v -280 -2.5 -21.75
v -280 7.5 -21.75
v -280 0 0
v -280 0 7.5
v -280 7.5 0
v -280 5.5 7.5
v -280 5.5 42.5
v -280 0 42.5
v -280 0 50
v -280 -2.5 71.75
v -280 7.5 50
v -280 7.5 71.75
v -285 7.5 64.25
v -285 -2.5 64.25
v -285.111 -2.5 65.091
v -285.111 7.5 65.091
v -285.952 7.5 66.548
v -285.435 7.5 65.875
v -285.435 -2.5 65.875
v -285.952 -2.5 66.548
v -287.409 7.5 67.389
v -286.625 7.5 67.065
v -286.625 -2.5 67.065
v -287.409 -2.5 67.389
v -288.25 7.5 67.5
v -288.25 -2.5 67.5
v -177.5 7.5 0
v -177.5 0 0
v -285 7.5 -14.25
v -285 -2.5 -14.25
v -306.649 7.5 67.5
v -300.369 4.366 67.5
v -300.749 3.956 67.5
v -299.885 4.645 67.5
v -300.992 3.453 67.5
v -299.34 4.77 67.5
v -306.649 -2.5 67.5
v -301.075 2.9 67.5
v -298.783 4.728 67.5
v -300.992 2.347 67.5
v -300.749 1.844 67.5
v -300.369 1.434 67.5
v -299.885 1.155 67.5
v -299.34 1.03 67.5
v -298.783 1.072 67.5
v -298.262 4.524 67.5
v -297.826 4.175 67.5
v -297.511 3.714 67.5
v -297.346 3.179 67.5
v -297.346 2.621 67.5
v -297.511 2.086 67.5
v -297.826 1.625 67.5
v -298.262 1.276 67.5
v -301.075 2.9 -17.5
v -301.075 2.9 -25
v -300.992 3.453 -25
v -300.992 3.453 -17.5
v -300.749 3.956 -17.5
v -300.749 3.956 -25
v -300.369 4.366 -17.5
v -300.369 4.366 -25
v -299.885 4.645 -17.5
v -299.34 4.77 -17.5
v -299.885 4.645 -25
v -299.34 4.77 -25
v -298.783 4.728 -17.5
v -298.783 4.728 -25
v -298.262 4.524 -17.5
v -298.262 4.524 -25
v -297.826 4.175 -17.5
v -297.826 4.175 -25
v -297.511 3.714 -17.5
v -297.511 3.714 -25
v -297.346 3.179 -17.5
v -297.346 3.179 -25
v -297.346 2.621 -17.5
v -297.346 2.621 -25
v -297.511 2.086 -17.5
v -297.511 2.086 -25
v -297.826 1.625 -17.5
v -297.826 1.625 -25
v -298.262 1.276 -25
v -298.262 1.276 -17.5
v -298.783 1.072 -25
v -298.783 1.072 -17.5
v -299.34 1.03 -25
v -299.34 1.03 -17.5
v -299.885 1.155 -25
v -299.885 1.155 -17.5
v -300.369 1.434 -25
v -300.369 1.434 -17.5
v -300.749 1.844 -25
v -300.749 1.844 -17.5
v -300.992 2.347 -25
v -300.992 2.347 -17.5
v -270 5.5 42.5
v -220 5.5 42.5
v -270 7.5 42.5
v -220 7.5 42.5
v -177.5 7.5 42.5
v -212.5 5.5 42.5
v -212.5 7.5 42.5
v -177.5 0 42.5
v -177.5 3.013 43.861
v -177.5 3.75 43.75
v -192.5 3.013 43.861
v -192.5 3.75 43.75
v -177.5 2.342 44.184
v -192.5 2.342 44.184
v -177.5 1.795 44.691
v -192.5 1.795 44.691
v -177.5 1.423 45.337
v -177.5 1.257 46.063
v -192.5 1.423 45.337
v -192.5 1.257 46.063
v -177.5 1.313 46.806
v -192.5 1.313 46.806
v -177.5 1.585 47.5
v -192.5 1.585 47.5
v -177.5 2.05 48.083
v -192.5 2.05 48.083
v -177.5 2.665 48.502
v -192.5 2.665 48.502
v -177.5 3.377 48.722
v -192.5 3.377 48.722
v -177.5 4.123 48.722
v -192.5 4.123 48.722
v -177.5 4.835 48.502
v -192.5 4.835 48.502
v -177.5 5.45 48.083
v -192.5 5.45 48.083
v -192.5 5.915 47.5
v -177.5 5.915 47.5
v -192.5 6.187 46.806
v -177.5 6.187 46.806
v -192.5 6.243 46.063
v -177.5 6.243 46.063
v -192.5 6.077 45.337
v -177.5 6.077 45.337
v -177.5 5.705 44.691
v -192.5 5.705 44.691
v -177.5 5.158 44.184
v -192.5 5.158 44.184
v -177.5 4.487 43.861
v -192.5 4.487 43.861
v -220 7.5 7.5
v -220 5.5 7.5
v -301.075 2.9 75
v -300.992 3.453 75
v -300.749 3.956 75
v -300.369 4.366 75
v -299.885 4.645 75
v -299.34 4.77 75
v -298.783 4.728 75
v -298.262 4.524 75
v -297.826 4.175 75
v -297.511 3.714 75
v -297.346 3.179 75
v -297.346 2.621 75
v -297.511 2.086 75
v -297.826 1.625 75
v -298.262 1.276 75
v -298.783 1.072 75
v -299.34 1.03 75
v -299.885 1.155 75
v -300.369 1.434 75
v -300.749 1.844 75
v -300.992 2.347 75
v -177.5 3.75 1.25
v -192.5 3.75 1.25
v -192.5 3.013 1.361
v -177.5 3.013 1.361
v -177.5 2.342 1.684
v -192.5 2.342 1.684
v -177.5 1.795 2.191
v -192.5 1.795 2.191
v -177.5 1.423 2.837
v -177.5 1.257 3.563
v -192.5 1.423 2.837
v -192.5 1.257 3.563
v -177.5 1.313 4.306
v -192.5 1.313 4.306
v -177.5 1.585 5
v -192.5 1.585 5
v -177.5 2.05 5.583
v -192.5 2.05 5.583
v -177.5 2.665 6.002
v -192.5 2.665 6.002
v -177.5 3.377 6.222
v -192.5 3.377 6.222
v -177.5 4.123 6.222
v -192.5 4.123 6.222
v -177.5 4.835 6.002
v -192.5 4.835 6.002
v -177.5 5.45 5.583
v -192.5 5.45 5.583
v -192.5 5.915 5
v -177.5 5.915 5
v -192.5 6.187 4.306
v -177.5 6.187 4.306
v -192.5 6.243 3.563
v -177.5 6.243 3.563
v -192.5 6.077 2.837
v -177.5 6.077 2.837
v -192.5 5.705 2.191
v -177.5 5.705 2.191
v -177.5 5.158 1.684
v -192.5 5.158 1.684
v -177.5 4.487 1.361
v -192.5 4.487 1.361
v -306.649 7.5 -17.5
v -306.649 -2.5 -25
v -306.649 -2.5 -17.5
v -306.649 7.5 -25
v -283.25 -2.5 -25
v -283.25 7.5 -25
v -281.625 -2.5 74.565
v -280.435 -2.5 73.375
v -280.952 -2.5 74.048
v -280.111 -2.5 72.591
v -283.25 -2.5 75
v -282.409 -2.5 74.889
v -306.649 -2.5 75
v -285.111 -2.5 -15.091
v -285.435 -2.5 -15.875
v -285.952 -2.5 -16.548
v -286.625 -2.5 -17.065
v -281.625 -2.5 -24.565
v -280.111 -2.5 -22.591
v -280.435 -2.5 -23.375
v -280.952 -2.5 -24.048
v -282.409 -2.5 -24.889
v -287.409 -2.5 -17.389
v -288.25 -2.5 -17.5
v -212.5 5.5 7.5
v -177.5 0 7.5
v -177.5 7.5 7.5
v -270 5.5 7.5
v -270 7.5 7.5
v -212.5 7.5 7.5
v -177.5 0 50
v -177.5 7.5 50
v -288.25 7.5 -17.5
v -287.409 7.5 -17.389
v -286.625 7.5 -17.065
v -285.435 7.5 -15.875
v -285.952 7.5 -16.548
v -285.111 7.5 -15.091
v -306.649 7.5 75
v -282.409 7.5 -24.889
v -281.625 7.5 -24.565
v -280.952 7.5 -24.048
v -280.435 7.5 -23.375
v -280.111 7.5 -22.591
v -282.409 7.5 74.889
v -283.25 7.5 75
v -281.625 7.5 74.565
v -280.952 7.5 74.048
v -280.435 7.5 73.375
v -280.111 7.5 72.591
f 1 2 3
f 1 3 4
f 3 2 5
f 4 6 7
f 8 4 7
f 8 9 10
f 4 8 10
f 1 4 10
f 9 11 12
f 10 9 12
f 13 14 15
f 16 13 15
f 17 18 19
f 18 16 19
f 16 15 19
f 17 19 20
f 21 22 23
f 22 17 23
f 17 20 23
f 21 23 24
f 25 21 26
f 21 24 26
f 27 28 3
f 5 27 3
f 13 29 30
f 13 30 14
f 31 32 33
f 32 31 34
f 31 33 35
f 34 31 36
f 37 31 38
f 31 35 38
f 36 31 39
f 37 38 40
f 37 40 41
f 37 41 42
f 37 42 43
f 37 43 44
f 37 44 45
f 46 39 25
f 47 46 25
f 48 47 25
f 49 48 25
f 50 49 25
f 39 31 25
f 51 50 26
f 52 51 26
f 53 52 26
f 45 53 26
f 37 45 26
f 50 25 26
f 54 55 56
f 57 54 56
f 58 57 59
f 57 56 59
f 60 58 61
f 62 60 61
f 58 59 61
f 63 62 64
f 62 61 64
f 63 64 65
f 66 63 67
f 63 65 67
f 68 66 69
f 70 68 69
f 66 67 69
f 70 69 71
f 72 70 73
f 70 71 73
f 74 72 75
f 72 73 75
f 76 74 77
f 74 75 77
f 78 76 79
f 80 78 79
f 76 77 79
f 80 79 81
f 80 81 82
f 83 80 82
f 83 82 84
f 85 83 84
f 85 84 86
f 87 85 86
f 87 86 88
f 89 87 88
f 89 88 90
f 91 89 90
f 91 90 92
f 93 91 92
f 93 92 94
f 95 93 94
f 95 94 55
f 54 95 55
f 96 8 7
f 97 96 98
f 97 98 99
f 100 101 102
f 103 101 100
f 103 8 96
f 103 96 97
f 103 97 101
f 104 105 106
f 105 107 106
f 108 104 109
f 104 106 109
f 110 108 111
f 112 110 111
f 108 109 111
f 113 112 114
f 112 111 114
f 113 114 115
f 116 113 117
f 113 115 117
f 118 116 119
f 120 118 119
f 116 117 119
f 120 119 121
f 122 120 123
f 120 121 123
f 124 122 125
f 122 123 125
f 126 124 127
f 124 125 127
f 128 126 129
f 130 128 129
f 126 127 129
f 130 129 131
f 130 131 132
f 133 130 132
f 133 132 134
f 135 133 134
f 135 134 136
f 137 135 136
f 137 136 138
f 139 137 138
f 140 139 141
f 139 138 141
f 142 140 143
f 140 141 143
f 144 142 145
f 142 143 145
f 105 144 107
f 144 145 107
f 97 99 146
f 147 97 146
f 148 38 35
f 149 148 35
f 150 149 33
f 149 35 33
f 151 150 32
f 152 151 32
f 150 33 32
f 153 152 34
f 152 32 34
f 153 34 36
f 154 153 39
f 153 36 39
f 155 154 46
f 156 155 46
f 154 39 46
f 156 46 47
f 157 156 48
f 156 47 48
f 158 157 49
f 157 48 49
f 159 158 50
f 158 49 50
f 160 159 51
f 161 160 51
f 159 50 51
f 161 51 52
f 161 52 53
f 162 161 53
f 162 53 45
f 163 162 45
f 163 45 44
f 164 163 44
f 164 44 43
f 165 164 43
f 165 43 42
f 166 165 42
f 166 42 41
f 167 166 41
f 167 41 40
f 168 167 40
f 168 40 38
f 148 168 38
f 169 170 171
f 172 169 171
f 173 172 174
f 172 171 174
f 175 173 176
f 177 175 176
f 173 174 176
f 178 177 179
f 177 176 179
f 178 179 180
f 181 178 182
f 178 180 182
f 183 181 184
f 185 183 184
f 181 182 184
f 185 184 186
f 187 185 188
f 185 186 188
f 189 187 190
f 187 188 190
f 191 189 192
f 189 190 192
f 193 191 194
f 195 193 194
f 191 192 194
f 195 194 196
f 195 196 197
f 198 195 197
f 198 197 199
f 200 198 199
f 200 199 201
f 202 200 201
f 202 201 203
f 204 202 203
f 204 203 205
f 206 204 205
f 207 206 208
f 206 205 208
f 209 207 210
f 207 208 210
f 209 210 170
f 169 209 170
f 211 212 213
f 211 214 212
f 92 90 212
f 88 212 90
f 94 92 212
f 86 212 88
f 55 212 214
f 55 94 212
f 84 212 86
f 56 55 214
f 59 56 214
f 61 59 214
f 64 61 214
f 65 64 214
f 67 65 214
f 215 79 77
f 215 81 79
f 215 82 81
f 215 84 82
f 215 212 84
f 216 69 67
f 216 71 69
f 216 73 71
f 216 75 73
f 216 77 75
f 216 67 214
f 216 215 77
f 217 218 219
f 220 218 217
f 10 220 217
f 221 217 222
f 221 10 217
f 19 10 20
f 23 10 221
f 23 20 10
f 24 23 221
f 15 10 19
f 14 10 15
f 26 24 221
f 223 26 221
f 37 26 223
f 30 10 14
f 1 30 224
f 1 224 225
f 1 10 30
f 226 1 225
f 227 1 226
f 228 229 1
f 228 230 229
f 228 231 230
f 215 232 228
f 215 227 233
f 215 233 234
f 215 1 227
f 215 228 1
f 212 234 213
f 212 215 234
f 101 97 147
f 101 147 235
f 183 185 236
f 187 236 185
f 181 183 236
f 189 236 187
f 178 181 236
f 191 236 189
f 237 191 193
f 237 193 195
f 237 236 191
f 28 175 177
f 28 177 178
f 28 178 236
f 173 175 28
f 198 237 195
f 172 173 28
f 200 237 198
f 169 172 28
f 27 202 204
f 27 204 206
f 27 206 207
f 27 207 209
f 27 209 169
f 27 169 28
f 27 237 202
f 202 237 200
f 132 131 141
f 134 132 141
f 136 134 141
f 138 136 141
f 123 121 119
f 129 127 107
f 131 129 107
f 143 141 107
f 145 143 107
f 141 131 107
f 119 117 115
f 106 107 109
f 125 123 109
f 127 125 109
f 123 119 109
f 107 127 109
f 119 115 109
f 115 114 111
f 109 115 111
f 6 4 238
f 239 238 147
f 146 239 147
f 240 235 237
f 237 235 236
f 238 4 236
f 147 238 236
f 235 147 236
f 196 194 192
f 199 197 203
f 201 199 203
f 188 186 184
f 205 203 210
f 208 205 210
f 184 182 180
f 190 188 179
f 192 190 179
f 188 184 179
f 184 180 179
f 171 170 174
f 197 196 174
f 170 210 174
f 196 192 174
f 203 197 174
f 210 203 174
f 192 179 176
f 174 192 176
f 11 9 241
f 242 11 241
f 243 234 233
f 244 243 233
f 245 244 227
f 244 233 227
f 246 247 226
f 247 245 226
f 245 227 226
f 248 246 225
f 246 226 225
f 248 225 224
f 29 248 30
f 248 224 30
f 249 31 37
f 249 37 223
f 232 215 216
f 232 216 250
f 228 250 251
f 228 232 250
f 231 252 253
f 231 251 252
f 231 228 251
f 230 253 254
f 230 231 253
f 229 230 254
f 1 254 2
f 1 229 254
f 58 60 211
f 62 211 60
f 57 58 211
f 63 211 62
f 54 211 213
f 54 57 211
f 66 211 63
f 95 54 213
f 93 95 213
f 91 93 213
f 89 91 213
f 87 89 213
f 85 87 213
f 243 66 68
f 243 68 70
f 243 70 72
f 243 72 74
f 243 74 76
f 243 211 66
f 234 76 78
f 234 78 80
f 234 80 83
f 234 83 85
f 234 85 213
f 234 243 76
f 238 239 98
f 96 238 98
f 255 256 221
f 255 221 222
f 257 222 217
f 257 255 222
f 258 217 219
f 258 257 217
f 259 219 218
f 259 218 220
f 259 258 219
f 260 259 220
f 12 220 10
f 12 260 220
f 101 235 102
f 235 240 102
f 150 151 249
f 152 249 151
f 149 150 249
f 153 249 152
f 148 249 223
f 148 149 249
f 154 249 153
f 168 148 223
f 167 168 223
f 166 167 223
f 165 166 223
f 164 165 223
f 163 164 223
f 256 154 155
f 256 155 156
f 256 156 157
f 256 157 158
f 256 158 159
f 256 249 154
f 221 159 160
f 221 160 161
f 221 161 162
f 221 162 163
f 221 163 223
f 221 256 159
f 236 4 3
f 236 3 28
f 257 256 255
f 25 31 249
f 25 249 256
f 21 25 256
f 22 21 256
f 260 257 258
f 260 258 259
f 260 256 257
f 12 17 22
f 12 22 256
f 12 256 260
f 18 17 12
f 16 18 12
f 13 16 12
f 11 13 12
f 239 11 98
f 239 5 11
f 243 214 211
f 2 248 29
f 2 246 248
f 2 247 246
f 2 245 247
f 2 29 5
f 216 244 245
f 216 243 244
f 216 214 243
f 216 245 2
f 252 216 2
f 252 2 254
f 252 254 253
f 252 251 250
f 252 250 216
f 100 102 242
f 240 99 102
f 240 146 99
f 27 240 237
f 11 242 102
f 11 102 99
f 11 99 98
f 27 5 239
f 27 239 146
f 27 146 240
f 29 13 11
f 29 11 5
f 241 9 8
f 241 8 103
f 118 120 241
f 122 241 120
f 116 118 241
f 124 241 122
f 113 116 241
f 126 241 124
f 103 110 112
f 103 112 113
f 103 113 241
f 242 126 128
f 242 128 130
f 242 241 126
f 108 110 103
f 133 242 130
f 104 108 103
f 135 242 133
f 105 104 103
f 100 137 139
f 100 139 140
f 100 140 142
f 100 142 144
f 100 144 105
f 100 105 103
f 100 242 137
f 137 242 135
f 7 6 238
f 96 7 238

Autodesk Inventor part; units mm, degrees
ref_plane "YZ Plane" through (0, 0, 0) normal (1, 0, 0) x (0, 1, 0)
ref_plane "XZ Plane" through (0, 0, 0) normal (0, 1, 0) x (-1, 0, 0)
ref_plane "XY Plane" through (0, 0, 0) normal (0, 0, 1) x (1, 0, 0)
sketch "Sketch1" plane through (0, 0, 0) normal (0, 1, 0) x (-1, 0, 0)
  line L0 (0, 0) -> (50, 0)
  line L1 (50, 0) -> (50, 50)
  line L2 (50, 50) -> (0, 50)
  line L3 (0, 50) -> (0, 0)
  line L4 (50, 50) -> (290, 50)
  line L5 (290, 50) -> (290, 42.5)
  line L6 (290, 42.5) -> (50, 42.5)
  line L7 (50, 42.5) -> (50, 50)
  line L8 (50, 0) -> (290, 0)
  line L9 (290, 0) -> (290, 7.5)
  line L10 (290, 7.5) -> (50, 7.5)
  line L11 (50, 7.5) -> (50, 0)
  dimension "d0" = 50
  dimension "d1" = 50
  dimension "d2" = 240
  dimension "d3" = 7.5
  dimension "d4" = 7.5
extrude "Extrusion1" add sketch "Sketch1" along normal blind 7.5
sketch "Sketch2" plane through (0, 7.5, 0) normal (0, 1, 0) x (1, 0, 0)
  line L0 (0, -50) -> (0, 0) projected
  point P0 (0, -25)
hole "Hole1" at (0, 7.5, 25) direction (0, -1, 0) diameter 6.35 end through all
sketch "Sketch3" plane through (0, 7.5, 0) normal (0, 1, 0) x (1, 0, 0)
  line L0 (-3.175, -50) -> (-3.175, 0) construction
  line L1 (-3.175, -50) -> (-28.175, -50) construction
  line L2 (-28.175, -50) -> (-28.175, 0) construction
  line L3 (-28.175, 0) -> (-3.175, 0) construction
  point P0 (0, 0)
  point P1 (-7.175, -4)
  point P2 (-24.175, -46)
  dimension "d14" = 25
hole "Hole2" at (-7.175, 7.5, 4) at (-24.175, 7.5, 46) direction (0, -1, 0) diameter 3.3 end through all
sketch "Sketch4" plane through (0, 7.5, 0) normal (0, 1, 0) x (1, 0, 0)
  arc A0 (0, -21.825) -> (0, -28.175) centre (0, -25) ccw construction
  line L0 (-3.175, -25) -> (-28.175, -25) construction
  line L1 (-3.175, -25) -> (21.825, -25) construction
  line L2 (-290, -50) -> (0, -50) construction
  line L3 (-28.175, -50) -> (-28.175, 0) construction
  line L4 (-50, -7.5) -> (-50, -42.5) construction
  line L5 (-50, -42.5) -> (-45, -42.5) construction
  line L6 (-45, -42.5) -> (-45, -32.5) construction
  line L7 (-45, -32.5) -> (-50, -32.5) construction
  line L8 (-50, -32.5) -> (-50, -42.5) construction
  line L9 (-45, -32.5) -> (-40, -32.5)
  line L10 (-40, -32.5) -> (-40, -42.5)
  line L11 (-40, -42.5) -> (-45, -42.5)
  line L12 (-45, -42.5) -> (-45, -32.5)
  point P0 (0, 0)
  dimension "d22" = 25
  dimension "d23" = 180
  dimension "d24" = 5
  dimension "d25" = 10
  dimension "d26" = 5
extrude "Extrusion2" add sketch "Sketch4" along normal blind 17.5
sketch "Sketch5" plane through (0, 7.5, 0) normal (0, 1, 0) x (1, 0, 0)
  line L0 (-85, -7.5) -> (-85, -42.5)
  line L1 (-127.5, -7.5) -> (-127.5, -42.5)
  line L2 (-92.5, -42.5) -> (-92.5, -7.5)
  line L3 (-135, -7.5) -> (-170, -7.5) construction
  line L4 (-170, -7.5) -> (-170, -42.5) construction
  line L5 (-170, -42.5) -> (-135, -42.5) construction
  line L6 (-135, -42.5) -> (-135, -7.5) construction
  line L7 (-177.5, -7.5) -> (-212.5, -7.5) construction
  line L8 (-212.5, -7.5) -> (-212.5, -42.5) construction
  line L9 (-212.5, -42.5) -> (-177.5, -42.5) construction
  line L10 (-177.5, -42.5) -> (-177.5, -7.5) construction
  line L11 (-220, -7.5) -> (-255, -7.5) construction
  line L12 (-255, -7.5) -> (-255, -42.5) construction
  line L13 (-255, -42.5) -> (-220, -42.5) construction
  line L14 (-220, -42.5) -> (-220, -7.5) construction
  line L15 (-85, -7.5) -> (-92.5, -7.5) construction
  line L16 (-92.5, -7.5) -> (-92.5, -42.5) construction
  line L17 (-92.5, -42.5) -> (-85, -42.5) construction
  line L18 (-85, -42.5) -> (-85, -7.5) construction
  line L19 (-127.5, -7.5) -> (-135, -7.5) construction
  line L20 (-135, -7.5) -> (-135, -42.5) construction
  line L21 (-135, -42.5) -> (-127.5, -42.5) construction
  line L22 (-127.5, -42.5) -> (-127.5, -7.5) construction
  line L23 (-170, -7.5) -> (-177.5, -7.5) construction
  line L24 (-177.5, -7.5) -> (-177.5, -42.5) construction
  line L25 (-177.5, -42.5) -> (-170, -42.5) construction
  line L26 (-170, -42.5) -> (-170, -7.5) construction
  line L27 (-212.5, -7.5) -> (-220, -7.5) construction
  line L28 (-220, -7.5) -> (-220, -42.5) construction
  line L29 (-220, -42.5) -> (-212.5, -42.5) construction
  line L30 (-212.5, -42.5) -> (-212.5, -7.5) construction
  line L31 (-220, -7.5) -> (-212.5, -7.5)
  line L32 (-212.5, -7.5) -> (-212.5, -42.5)
  line L33 (-212.5, -42.5) -> (-220, -42.5)
  line L34 (-220, -42.5) -> (-220, -7.5)
  line L35 (-177.5, -7.5) -> (-170, -7.5)
  line L36 (-170, -7.5) -> (-170, -42.5)
  line L37 (-170, -42.5) -> (-177.5, -42.5)
  line L38 (-177.5, -42.5) -> (-177.5, -7.5)
  line L39 (-135, -7.5) -> (-127.5, -7.5)
  line L40 (-127.5, -7.5) -> (-127.5, -42.5)
  line L41 (-127.5, -42.5) -> (-135, -42.5)
  line L42 (-135, -42.5) -> (-135, -7.5)
  line L43 (-92.5, -7.5) -> (-85, -7.5)
  line L44 (-85, -7.5) -> (-85, -42.5)
  line L45 (-85, -42.5) -> (-92.5, -42.5)
  line L46 (-92.5, -42.5) -> (-92.5, -7.5)
  point P0 (0, 0)
  point P1 (-50, -7.5)
  dimension "d30" = 35
  dimension "d31" = 35
  dimension "d32" = 35
  dimension "d33" = 35
  dimension "d34" = 35
  dimension "d35" = 35
extrude "Extrusion3" add sketch "Sketch5" against normal blind 2
sketch "Sketch6" plane through (0, 7.5, 0) normal (0, 1, 0) x (1, 0, 0)
  line L0 (-290, 0) -> (-290, -7.5) projected
  line L1 (-290, -50) -> (0, -50) projected
  line L2 (-290, 0) -> (-280, 0)
  line L3 (-280, 0) -> (-280, -50)
  line L4 (-280, -50) -> (-290, -50)
  line L5 (-290, -50) -> (-290, 0)
  point P0 (0, 0)
  dimension "d38" = 10
extrude "Extrusion4" cut sketch "Sketch6" against normal blind 7.5
sketch "Sketch7" plane through (-280, 7.5, 0) normal (-1, 0, 0) x (0, 0, 1)
  point P0 (0, -7.5)
sketch "Sketch8" plane through (-280, 7.5, 0) normal (-1, 0, 0) x (0, 0, 1)
  line L0 (-25, 0) -> (75, 0)
  line L1 (75, 0) -> (75, -7.5)
  line L2 (75, -7.5) -> (-25, -7.5)
  line L3 (-25, -7.5) -> (-25, 0)
  line L4 (-25, 0) -> (75, 0)
  line L5 (75, 0) -> (75, -10)
  line L6 (75, -10) -> (-25, -10)
  line L7 (-25, -10) -> (-25, 0)
  point P0 (0, -7.5)
  dimension "d41" = 100
  dimension "d42" = 10
extrude "Extrusion5" add sketch "Sketch8" along normal blind 7.5
sketch "Sketch9" plane through (-287.5, 7.5, 0) normal (-1, 0, 0) x (0, 0, 1)
  line L0 (75, 0) -> (-25, 0) projected
  line L1 (-25, -10) -> (75, -10) projected
  line L2 (-25, 0) -> (-17.5, 0)
  line L3 (-17.5, 0) -> (-17.5, -10)
  line L4 (-17.5, -10) -> (-25, -10)
  line L5 (-25, -10) -> (-25, 0)
  line L6 (75, 0) -> (67.5, 0)
  line L7 (67.5, 0) -> (67.5, -10)
  line L8 (67.5, -10) -> (75, -10)
  line L9 (75, -10) -> (75, 0)
  point P0 (0, -7.5)
  dimension "d45" = 7.5
  dimension "d46" = 7.5
extrude "Extrusion6" add sketch "Sketch9" along normal blind 25 contours L9 L1 L7 L0 | L3 L1 L5 L0
sketch "Sketch10" plane through (-287.5, -2.5, -17.5) normal (0, 0, 1) x (1, 0, 0)
  line L0 (0, 0) -> (-25, 0) construction
  line L1 (0, 0) -> (-3, 0) construction
  line L2 (-3, 0) -> (-6.2, 0)
  line L3 (-6.2, 0) -> (-6.2, 2.1)
  line L4 (-6.2, 2.1) -> (-3, 2.1)
  line L5 (-3, 2.1) -> (-3, 0)
  line L6 (-6.2, 2.1) -> (-11.7, 2.1) construction
  line L7 (-11.7, 2.1) -> (-11.7, 5.4) construction
  point P0 (287.5, 2.5)
  dimension "d49" = 3
  dimension "d50" = 3.2
  dimension "d51" = 2.1
  dimension "d52" = 5.5
  dimension "d53" = 3.3
extrude "Extrusion7" add sketch "Sketch10" along normal blind 92.5
sketch "Sketch11" plane through (-287.5, -2.5, -17.5) normal (0, 0, 1) x (1, 0, 0)
  line L0 (-6.2, 2.1) -> (-3, 2.1) construction
  line L1 (-6.2, 2.1) -> (-11.7, 2.1) construction
  line L2 (-11.7, 2.1) -> (-11.7, 5.4) construction
  circle A0 centre (-11.7, 5.4) radius 2.125
  point P0 (287.5, 2.5)
  dimension "d56" = 5.5
  dimension "d57" = 3.3
  dimension "d58" = 4.25
extrude "Extrusion8" cut sketch "Sketch11" along normal mid plane 241
sketch "Sketch12" plane through (-287.5, -2.5, -17.5) normal (0, 0, 1) x (1, 0, 0)
  circle A0 centre (-11.7, 5.4) radius 2.125 construction
  line L0 (-11.7, 5.4) -> (-11.7, 0.96) construction
  line L1 (-11.7, 0.96) -> (-16.7, 0.96) construction
  line L2 (-6.2, 0) -> (-25, 0) projected
  line L3 (-16.7, 0.96) -> (-19.2, 0.96)
  line L4 (-19.2, 0.96) -> (-19.2, 0)
  line L5 (-19.2, 0) -> (-16.7, 0)
  line L6 (-16.7, 0) -> (-16.7, 0.96)
  point P0 (287.5, 2.5)
  dimension "d61" = 4.44
  dimension "d62" = 5
  dimension "d63" = 2.5
extrude "Extrusion9" add sketch "Sketch12" along normal blind 91.25
sketch "Sketch13" plane through (-293.7, -0.4, -17.5) normal (0, 1, 0) x (1, 0, 0)
  line L0 (3.2, 0) -> (3.2, -85) construction
  line L1 (3.2, 0) -> (3.2, -30) construction
  line L2 (0, 0) -> (0, -85) construction
  line L3 (3.2, -30) -> (0, -30) construction
  line L4 (0, -30) -> (0, -36.35) construction
  line L5 (0, -36.35) -> (3.2, -36.35) construction
  line L6 (3.2, -36.35) -> (3.2, -30) construction
  line L7 (0, -30) -> (3.2, -30)
  line L8 (3.2, -30) -> (3.2, -36.35)
  line L9 (3.2, -36.35) -> (0, -36.35)
  line L10 (0, -36.35) -> (0, -30)
  point P0 (293.7, -17.5)
  dimension "d66" = 30
  dimension "d67" = 6.35
extrude "Extrusion10" add sketch "Sketch13" along normal blind 3.8
sketch "Sketch14" plane through (0, 7.5, 0) normal (0, 1, 0) x (1, 0, 0)
  line L0 (-287.5, 17.5) -> (-287.5, -67.5) projected
  line L1 (-287.5, 17.5) -> (-285, 17.5)
  line L2 (-285, 17.5) -> (-285, -67.5)
  line L3 (-285, -67.5) -> (-287.5, -67.5)
  line L4 (-287.5, -67.5) -> (-287.5, 17.5)
  point P0 (0, 0)
  dimension "d70" = 2.5
extrude "Extrusion11" cut sketch "Sketch14" against normal blind 14.55
sketch "Sketch15" plane through (0, 7.5, 0) normal (0, 1, 0) x (1, 0, 0)
  line L0 (-312.5, 17.5) -> (-312.5, 25) projected
  line L1 (-280, -75) -> (-312.5, -75) projected
  line L2 (-312.5, 25) -> (-306.6488, 25)
  line L3 (-306.6488, 25) -> (-306.6488, -75)
  line L4 (-306.6488, -75) -> (-312.5, -75)
  line L5 (-312.5, -75) -> (-312.5, 25)
  point P0 (0, 0)
extrude "Extrusion12" cut sketch "Sketch15" against normal blind 14.55
fillet "Fillet1" radius 0.1 1 edges at (-301.325, 2.9, -17.5)
fillet "Fillet2" radius 0.1 1 edges at (-301.325, 2.9, 67.5)
fillet "Fillet3" radius 3.25 1 edges at (-280, 2.5, 75)
fillet "Fillet4" radius 3.25 1 edges at (-285, 2.5, 67.5)
fillet "Fillet5" radius 3.25 1 edges at (-280, 2.5, -25)
fillet "Fillet6" radius 3.25 1 edges at (-285, 2.5, -17.5)
sketch "Sketch16" plane through (0, 7.5, 0) normal (0, 1, 0) x (1, 0, 0)
  line L0 (-220, -42.5) -> (-220, -7.5) construction
  line L1 (-220, -42.5) -> (-280, -42.5) construction
  line L2 (-220, -7.5) -> (-255, -7.5) construction
  line L3 (-255, -7.5) -> (-255, -42.5) construction
  line L4 (-255, -42.5) -> (-220, -42.5) construction
  line L5 (-220, -42.5) -> (-220, -7.5) construction
  line L6 (-280, -7.5) -> (-280, 0) projected
  line L7 (-280, -7.5) -> (-270, -7.5)
  line L8 (-270, -7.5) -> (-270, -42.5)
  line L9 (-270, -42.5) -> (-280, -42.5)
  line L10 (-280, -42.5) -> (-280, -7.5)
  point P0 (0, 0)
  dimension "d81" = 35
  dimension "d82" = 10
extrude "Extrusion13" add sketch "Sketch16" against normal blind 2
sketch "Sketch17" plane through (0, 7.5, 0) normal (0, 1, 0) x (1, 0, 0)
  point P0 (0, 0)
sketch "Sketch18" plane through (0, 7.5, 0) normal (0, 1, 0) x (1, 0, 0)
  line L0 (-270, -7.5) -> (-270, -42.5) construction
  line L1 (-285, -64.25) -> (-285, 14.25) construction
  line L2 (-280, -7.5) -> (-280, 0) construction
  line L3 (-270, -7.5) -> (-280, -7.5) construction
  line L4 (-275, -7.5) -> (-275, -42.5) construction
  line L5 (-50, -42.5) -> (-280, -42.5) construction
  circle A0 centre (-275, -12.5) radius 1.8 construction
  circle A1 centre (-275, -37.5) radius 1.8 construction
  circle A2 centre (-275, -12.5) radius 1.8
  circle A3 centre (-275, -37.5) radius 1.8
  point P0 (0, 0)
  dimension "d85" = 3.6
  dimension "d86" = 3.6
hole "Hole3" at (-275, 7.5, 12.5) at (-275, 7.5, 37.5) direction (0, -1, 0) diameter 3.3 depth 15 tip angle 118
sketch "Sketch19" plane through (0, 7.5, 0) normal (0, 1, 0) x (1, 0, 0)
  circle A0 centre (-275, -12.5) radius 1.65 construction
  line L0 (-275, -12.5) -> (-212.5, -12.5) construction
  line L1 (-212.5, -7.5) -> (-212.5, -42.5) construction
  circle A1 centre (-275, -37.5) radius 1.65 construction
  line L2 (-275, -37.5) -> (-212.5, -37.5) construction
  line L3 (-220, -42.5) -> (-220, -7.5) construction
  line L4 (-220, -12.5) -> (-212.5, -12.5) construction
  line L5 (-216.25, -12.5) -> (-216.25, -37.5) construction
  point P0 (0, 0)
hole "Hole4" at (-216.25, 7.5, 12.5) at (-216.25, 7.5, 37.5) direction (0, -1, 0) diameter 3.3 depth 15 tip angle 118
sketch "Sketch20" plane through (-45, 7.5, 32.5) normal (-1, 0, 0) x (0, 0, 1)
  line L0 (10, 17.5) -> (0, 17.5) construction
  line L1 (5, 17.5) -> (5, -0.1335) construction
  line L2 (10, 0) -> (10, 17.5) construction
  line L3 (10, 12.5) -> (5, 12.5) construction
  circle A0 centre (5, 12.5) radius 3
  point P0 (-32.5, -7.5)
  dimension "d101" = 6
extrude "Extrusion14" cut sketch "Sketch20" against normal blind 20
sketch "Sketch21" plane through (0, 7.5, 0) normal (0, 1, 0) x (1, 0, 0)
  line L0 (-306.6488, 17.5) -> (-306.6488, -67.5) projected
  line L1 (-306.6488, 17.5) -> (-288.25, 17.5) projected
  line L2 (-306.6488, -67.5) -> (-288.25, -67.5)
  line L3 (-288.25, -67.5) -> (-288.25, 17.5)
  line L4 (-288.25, 17.5) -> (-306.6488, 17.5)
  line L5 (-306.6488, 17.5) -> (-306.6488, -67.5)
  point P0 (0, 0)
extrude "Extrusion15" cut sketch "Sketch21" against normal blind 10
sketch "Sketch22" plane through (0, 7.5, 0) normal (0, 1, 0) x (1, 0, 0)
  line L0 (-280, -50) -> (0, -50) projected
  line L1 (0, 0) -> (-280, 0) projected
  line L2 (-280, -50) -> (-270.5687, -50)
  line L3 (-270.5687, -50) -> (-270.5687, 0)
  line L4 (-270.5687, 0) -> (-280, 0)
  line L5 (-280, 0) -> (-280, -50)
  line L6 (-50, -42.5) -> (-280, -42.5) projected
  line L7 (-219.3019, -42.5) -> (-213.3073, -42.5)
  line L8 (-213.3073, -42.5) -> (-213.3073, -8.284)
  line L9 (-213.3073, -8.284) -> (-219.3019, -8.284)
  line L10 (-219.3019, -8.284) -> (-219.3019, -42.5)
extrude "Extrusion16" add sketch "Sketch22" against normal blind 2
sketch "Sketch23" plane through (-306.6488, -2.5, -25) normal (0, 0, -1) x (-1, 0, 0)
  circle A0 centre (-7.4488, 5.4) radius 2.125 projected
  circle A1 centre (-7.4488, 5.4) radius 2
  circle A2 centre (-7.4488, 5.4) radius 2.4429
  point P0 (-306.6488, 2.5)
  dimension "d108" = 4
extrude "Extrusion17" add sketch "Sketch23" against normal blind 100 contours A0 | A2
sketch "Sketch24" plane through (0, 7.5, 0) normal (0, 1, 0) x (1, 0, 0)
  line L0 (-288.25, -67.5) -> (-306.6488, -67.5) projected
  arc A0 (-285, 14.25) -> (-288.25, 17.5) centre (-288.25, 14.25) ccw projected
  line L1 (-306.6488, -67.5) -> (-288.25, -67.5)
  line L2 (-288.25, -67.5) -> (-288.25, 17.5)
  line L3 (-288.25, 17.5) -> (-306.6488, 17.5)
  line L4 (-306.6488, 17.5) -> (-306.6488, -67.5)
  point P0 (0, 0)
extrude "Extrusion18" cut sketch "Sketch24" against normal blind 100
sketch "Sketch25" plane through (0, 7.5, 0) normal (0, 1, 0) x (1, 0, 0)
  line L0 (-50, -42.5) -> (-280, -42.5) projected
  line L1 (-280, -7.5) -> (-50, -7.5) projected
  line L2 (-50, -42.5) -> (-55, -42.5)
  line L3 (-55, -42.5) -> (-55, -7.5)
  line L4 (-55, -7.5) -> (-50, -7.5)
  line L5 (-50, -7.5) -> (-50, -42.5)
  point P0 (0, 0)
  dimension "d113" = 5
extrude "Extrusion19" add sketch "Sketch25" against normal blind 2
sketch "Sketch26" plane through (0, 7.5, 0) normal (0, 1, 0) x (1, 0, 0)
  line L0 (-55, -42.5) -> (-85, -42.5) construction
  line L1 (-55, -42.5) -> (-50, -42.5) construction
  line L2 (-55, -42.5) -> (-50, -42.5) construction
  line L3 (-50, -42.5) -> (-50, -7.5) construction
  line L4 (-50, -42.5) -> (-50, -7.5) construction
  circle A0 centre (-50, -37.5) radius 1.65 construction
  circle A1 centre (-50, -12.5) radius 1.65 construction
  circle A2 centre (-50, -37.5) radius 1.65
  circle A3 centre (-50, -12.5) radius 1.65
  line L5 (-50, -37.5) -> (-92.5, -37.5) construction
  line L6 (-92.5, -42.5) -> (-92.5, -7.5) construction
  line L7 (-50, -12.5) -> (-92.5, -12.5) construction
  line L8 (-92.5, -37.5) -> (-85, -37.5) construction
  line L9 (-85, -7.5) -> (-85, -42.5) construction
  line L10 (-88.75, -37.5) -> (-88.75, -12.5) construction
  circle A4 centre (-88.75, -37.5) radius 1.65
  circle A5 centre (-88.75, -12.5) radius 1.65
  point P0 (0, 0)
  dimension "d116" = 3.3
  dimension "d117" = 3.3
  dimension "d118" = 3.3
  dimension "d119" = 3.3
extrude "Extrusion20" cut sketch "Sketch26" against normal blind 2
sketch "Sketch27" plane through (0, 5.5, 0) normal (0, -1, 0) x (1, 0, 0)
  line L0 (-50, 7.5) -> (-55, 7.5) projected
  line L1 (-55, 7.5) -> (-46.6169, 7.5)
  line L2 (-46.6169, 7.5) -> (-46.6169, 42.5)
  line L3 (-46.6169, 42.5) -> (-55, 42.5)
  line L4 (-55, 42.5) -> (-55, 7.5)
  point P0 (0, 0)
extrude "Extrusion21" add sketch "Sketch27" along normal blind 5.5
sketch "Sketch28" plane through (0, 7.5, 0) normal (0, 1, 0) x (1, 0, 0)
  circle A0 centre (-50, -12.5) radius 1.65 projected
  circle A1 centre (-50, -37.5) radius 1.65 projected
  point P0 (0, 0)
hole "Hole5" at (-50, 7.5, 12.5) at (-50, 7.5, 37.5) direction (0, -1, 0) diameter 3.3 depth 8 tip angle 118
sketch "Sketch29" plane through (0, 7.5, 0) normal (0, 1, 0) x (1, 0, 0)
  circle A0 centre (-7.175, -4) radius 1.65 construction
  circle A1 centre (-24.175, -46) radius 1.65 construction
  line L0 (-7.175, -4) -> (-24.175, -46) construction
  line L1 (-7.175, -4) -> (-7.175, -46) construction
  line L2 (-7.175, -46) -> (-24.175, -46) construction
  line L3 (-7.175, -25) -> (-25.825, -25) construction
  line L4 (-25.825, -25) -> (-25.825, -46) construction
  line L5 (-16.5, -25) -> (-25.825, -25) construction
  line L6 (-24.175, -46) -> (-24.175, -25) construction
  line L7 (-15.675, -46) -> (-15.675, -4) construction
  line L8 (-40, -32.5) -> (-40, -42.5) construction
  line L9 (-40, -42.5) -> (-24.175, -42.5) construction
  line L10 (-24.175, -42.5) -> (-24.175, -46) construction
  line L11 (-15.675, -25) -> (-15.675, -46) construction
  line L12 (-15.675, -46) -> (-15.675, -4) construction
  circle A2 centre (-15.675, -46) radius 1.65 construction
  circle A3 centre (-15.675, -46) radius 1.65
  circle A4 centre (-15.675, -4) radius 1.65
  point P0 (0, 0)
  dimension "d131" = 42
  dimension "d132" = 17
  dimension "d133" = 21
  dimension "d135" = 8.5
  dimension "d136" = 15.825
  dimension "d137" = 3.5
  dimension "d138" = 21
  dimension "d139" = 3.3
  dimension "d140" = 3.3
  dimension "d141" = 3.3
extrude "Extrusion22" cut sketch "Sketch29" against normal blind 10
sketch "Sketch30" plane through (0, 7.5, 0) normal (0, 1, 0) x (1, 0, 0)
  circle A0 centre (-7.175, -4) radius 1.65 projected
  circle A1 centre (-7.175, -4) radius 2.1021
  circle A2 centre (-24.175, -46) radius 1.65 projected
  circle A3 centre (-24.175, -46) radius 2.9173
  point P0 (0, 0)
extrude "Extrusion23" add sketch "Sketch30" against normal blind 7.5 contours A0 | A1 | A2 | A3
sketch "Sketch31" plane through (0, 25, 0) normal (0, 1, 0) x (1, 0, 0)
  line L0 (0, -50) -> (-177.5, -50)
  line L1 (-177.5, -50) -> (-177.5, 0)
  line L2 (-177.5, 0) -> (0, 0)
  line L3 (0, 0) -> (0, -50)
extrude "Extrusion24" cut sketch "Sketch31" against normal blind 100
sketch "Sketch32" plane through (-177.5, 0, 42.5) normal (1, 0, 0) x (0, 0, -1)
  line L0 (56.75, 7.5) -> (-21.75, 7.5) construction
  line L1 (0, 0) -> (-7.5, 0) construction
  line L2 (0, 7.5) -> (-7.5, 0) construction
  line L3 (-7.5, 0) -> (-7.5, 7.5) construction
  line L4 (0, 0) -> (0, 5.5) construction
  line L5 (-7.5, 7.5) -> (0, 0) construction
  line L6 (35, 5.5) -> (35, 0) construction
  line L7 (35, 0) -> (42.5, 7.5) construction
  line L8 (35, 7.5) -> (42.5, 0) construction
  point P0 (38.75, 3.75)
  point P1 (-3.75, 3.75)
hole "Hole6" at (-177.5, 3.75, 3.75) at (-177.5, 3.75, 46.25) direction (-1, 0, 0) diameter 5 depth 15
sketch "Sketch33" plane through (-306.6488, -2.5, -25) normal (0, 0, -1) x (-1, 0, 0)
  circle A0 centre (-7.4488, 5.4) radius 2 projected
  circle A1 centre (-7.4488, 5.4) radius 2
  circle A2 centre (-7.4488, 5.4) radius 1.875
  point P0 (-306.6488, 2.5)
  dimension "d155" = 3.75
extrude "Extrusion25" add sketch "Sketch33" against normal blind 100
sketch "Sketch34" plane through (0, 7.5, 0) normal (0, 1, 0) x (1, 0, 0)
  line L0 (-288.25, -67.5) -> (-306.6488, -67.5) projected
  line L1 (-306.6488, 17.5) -> (-288.25, 17.5) projected
  line L2 (-288.25, -67.5) -> (-306.6488, -67.5)
  line L3 (-306.6488, -67.5) -> (-306.6488, 17.5)
  line L4 (-306.6488, 17.5) -> (-288.25, 17.5)
  line L5 (-288.25, 17.5) -> (-288.25, -67.5)
  point P0 (0, 0)
extrude "Extrusion26" cut sketch "Sketch34" against normal blind 100
properties part number "mtv_frame(BrakeInBack)1-13"
